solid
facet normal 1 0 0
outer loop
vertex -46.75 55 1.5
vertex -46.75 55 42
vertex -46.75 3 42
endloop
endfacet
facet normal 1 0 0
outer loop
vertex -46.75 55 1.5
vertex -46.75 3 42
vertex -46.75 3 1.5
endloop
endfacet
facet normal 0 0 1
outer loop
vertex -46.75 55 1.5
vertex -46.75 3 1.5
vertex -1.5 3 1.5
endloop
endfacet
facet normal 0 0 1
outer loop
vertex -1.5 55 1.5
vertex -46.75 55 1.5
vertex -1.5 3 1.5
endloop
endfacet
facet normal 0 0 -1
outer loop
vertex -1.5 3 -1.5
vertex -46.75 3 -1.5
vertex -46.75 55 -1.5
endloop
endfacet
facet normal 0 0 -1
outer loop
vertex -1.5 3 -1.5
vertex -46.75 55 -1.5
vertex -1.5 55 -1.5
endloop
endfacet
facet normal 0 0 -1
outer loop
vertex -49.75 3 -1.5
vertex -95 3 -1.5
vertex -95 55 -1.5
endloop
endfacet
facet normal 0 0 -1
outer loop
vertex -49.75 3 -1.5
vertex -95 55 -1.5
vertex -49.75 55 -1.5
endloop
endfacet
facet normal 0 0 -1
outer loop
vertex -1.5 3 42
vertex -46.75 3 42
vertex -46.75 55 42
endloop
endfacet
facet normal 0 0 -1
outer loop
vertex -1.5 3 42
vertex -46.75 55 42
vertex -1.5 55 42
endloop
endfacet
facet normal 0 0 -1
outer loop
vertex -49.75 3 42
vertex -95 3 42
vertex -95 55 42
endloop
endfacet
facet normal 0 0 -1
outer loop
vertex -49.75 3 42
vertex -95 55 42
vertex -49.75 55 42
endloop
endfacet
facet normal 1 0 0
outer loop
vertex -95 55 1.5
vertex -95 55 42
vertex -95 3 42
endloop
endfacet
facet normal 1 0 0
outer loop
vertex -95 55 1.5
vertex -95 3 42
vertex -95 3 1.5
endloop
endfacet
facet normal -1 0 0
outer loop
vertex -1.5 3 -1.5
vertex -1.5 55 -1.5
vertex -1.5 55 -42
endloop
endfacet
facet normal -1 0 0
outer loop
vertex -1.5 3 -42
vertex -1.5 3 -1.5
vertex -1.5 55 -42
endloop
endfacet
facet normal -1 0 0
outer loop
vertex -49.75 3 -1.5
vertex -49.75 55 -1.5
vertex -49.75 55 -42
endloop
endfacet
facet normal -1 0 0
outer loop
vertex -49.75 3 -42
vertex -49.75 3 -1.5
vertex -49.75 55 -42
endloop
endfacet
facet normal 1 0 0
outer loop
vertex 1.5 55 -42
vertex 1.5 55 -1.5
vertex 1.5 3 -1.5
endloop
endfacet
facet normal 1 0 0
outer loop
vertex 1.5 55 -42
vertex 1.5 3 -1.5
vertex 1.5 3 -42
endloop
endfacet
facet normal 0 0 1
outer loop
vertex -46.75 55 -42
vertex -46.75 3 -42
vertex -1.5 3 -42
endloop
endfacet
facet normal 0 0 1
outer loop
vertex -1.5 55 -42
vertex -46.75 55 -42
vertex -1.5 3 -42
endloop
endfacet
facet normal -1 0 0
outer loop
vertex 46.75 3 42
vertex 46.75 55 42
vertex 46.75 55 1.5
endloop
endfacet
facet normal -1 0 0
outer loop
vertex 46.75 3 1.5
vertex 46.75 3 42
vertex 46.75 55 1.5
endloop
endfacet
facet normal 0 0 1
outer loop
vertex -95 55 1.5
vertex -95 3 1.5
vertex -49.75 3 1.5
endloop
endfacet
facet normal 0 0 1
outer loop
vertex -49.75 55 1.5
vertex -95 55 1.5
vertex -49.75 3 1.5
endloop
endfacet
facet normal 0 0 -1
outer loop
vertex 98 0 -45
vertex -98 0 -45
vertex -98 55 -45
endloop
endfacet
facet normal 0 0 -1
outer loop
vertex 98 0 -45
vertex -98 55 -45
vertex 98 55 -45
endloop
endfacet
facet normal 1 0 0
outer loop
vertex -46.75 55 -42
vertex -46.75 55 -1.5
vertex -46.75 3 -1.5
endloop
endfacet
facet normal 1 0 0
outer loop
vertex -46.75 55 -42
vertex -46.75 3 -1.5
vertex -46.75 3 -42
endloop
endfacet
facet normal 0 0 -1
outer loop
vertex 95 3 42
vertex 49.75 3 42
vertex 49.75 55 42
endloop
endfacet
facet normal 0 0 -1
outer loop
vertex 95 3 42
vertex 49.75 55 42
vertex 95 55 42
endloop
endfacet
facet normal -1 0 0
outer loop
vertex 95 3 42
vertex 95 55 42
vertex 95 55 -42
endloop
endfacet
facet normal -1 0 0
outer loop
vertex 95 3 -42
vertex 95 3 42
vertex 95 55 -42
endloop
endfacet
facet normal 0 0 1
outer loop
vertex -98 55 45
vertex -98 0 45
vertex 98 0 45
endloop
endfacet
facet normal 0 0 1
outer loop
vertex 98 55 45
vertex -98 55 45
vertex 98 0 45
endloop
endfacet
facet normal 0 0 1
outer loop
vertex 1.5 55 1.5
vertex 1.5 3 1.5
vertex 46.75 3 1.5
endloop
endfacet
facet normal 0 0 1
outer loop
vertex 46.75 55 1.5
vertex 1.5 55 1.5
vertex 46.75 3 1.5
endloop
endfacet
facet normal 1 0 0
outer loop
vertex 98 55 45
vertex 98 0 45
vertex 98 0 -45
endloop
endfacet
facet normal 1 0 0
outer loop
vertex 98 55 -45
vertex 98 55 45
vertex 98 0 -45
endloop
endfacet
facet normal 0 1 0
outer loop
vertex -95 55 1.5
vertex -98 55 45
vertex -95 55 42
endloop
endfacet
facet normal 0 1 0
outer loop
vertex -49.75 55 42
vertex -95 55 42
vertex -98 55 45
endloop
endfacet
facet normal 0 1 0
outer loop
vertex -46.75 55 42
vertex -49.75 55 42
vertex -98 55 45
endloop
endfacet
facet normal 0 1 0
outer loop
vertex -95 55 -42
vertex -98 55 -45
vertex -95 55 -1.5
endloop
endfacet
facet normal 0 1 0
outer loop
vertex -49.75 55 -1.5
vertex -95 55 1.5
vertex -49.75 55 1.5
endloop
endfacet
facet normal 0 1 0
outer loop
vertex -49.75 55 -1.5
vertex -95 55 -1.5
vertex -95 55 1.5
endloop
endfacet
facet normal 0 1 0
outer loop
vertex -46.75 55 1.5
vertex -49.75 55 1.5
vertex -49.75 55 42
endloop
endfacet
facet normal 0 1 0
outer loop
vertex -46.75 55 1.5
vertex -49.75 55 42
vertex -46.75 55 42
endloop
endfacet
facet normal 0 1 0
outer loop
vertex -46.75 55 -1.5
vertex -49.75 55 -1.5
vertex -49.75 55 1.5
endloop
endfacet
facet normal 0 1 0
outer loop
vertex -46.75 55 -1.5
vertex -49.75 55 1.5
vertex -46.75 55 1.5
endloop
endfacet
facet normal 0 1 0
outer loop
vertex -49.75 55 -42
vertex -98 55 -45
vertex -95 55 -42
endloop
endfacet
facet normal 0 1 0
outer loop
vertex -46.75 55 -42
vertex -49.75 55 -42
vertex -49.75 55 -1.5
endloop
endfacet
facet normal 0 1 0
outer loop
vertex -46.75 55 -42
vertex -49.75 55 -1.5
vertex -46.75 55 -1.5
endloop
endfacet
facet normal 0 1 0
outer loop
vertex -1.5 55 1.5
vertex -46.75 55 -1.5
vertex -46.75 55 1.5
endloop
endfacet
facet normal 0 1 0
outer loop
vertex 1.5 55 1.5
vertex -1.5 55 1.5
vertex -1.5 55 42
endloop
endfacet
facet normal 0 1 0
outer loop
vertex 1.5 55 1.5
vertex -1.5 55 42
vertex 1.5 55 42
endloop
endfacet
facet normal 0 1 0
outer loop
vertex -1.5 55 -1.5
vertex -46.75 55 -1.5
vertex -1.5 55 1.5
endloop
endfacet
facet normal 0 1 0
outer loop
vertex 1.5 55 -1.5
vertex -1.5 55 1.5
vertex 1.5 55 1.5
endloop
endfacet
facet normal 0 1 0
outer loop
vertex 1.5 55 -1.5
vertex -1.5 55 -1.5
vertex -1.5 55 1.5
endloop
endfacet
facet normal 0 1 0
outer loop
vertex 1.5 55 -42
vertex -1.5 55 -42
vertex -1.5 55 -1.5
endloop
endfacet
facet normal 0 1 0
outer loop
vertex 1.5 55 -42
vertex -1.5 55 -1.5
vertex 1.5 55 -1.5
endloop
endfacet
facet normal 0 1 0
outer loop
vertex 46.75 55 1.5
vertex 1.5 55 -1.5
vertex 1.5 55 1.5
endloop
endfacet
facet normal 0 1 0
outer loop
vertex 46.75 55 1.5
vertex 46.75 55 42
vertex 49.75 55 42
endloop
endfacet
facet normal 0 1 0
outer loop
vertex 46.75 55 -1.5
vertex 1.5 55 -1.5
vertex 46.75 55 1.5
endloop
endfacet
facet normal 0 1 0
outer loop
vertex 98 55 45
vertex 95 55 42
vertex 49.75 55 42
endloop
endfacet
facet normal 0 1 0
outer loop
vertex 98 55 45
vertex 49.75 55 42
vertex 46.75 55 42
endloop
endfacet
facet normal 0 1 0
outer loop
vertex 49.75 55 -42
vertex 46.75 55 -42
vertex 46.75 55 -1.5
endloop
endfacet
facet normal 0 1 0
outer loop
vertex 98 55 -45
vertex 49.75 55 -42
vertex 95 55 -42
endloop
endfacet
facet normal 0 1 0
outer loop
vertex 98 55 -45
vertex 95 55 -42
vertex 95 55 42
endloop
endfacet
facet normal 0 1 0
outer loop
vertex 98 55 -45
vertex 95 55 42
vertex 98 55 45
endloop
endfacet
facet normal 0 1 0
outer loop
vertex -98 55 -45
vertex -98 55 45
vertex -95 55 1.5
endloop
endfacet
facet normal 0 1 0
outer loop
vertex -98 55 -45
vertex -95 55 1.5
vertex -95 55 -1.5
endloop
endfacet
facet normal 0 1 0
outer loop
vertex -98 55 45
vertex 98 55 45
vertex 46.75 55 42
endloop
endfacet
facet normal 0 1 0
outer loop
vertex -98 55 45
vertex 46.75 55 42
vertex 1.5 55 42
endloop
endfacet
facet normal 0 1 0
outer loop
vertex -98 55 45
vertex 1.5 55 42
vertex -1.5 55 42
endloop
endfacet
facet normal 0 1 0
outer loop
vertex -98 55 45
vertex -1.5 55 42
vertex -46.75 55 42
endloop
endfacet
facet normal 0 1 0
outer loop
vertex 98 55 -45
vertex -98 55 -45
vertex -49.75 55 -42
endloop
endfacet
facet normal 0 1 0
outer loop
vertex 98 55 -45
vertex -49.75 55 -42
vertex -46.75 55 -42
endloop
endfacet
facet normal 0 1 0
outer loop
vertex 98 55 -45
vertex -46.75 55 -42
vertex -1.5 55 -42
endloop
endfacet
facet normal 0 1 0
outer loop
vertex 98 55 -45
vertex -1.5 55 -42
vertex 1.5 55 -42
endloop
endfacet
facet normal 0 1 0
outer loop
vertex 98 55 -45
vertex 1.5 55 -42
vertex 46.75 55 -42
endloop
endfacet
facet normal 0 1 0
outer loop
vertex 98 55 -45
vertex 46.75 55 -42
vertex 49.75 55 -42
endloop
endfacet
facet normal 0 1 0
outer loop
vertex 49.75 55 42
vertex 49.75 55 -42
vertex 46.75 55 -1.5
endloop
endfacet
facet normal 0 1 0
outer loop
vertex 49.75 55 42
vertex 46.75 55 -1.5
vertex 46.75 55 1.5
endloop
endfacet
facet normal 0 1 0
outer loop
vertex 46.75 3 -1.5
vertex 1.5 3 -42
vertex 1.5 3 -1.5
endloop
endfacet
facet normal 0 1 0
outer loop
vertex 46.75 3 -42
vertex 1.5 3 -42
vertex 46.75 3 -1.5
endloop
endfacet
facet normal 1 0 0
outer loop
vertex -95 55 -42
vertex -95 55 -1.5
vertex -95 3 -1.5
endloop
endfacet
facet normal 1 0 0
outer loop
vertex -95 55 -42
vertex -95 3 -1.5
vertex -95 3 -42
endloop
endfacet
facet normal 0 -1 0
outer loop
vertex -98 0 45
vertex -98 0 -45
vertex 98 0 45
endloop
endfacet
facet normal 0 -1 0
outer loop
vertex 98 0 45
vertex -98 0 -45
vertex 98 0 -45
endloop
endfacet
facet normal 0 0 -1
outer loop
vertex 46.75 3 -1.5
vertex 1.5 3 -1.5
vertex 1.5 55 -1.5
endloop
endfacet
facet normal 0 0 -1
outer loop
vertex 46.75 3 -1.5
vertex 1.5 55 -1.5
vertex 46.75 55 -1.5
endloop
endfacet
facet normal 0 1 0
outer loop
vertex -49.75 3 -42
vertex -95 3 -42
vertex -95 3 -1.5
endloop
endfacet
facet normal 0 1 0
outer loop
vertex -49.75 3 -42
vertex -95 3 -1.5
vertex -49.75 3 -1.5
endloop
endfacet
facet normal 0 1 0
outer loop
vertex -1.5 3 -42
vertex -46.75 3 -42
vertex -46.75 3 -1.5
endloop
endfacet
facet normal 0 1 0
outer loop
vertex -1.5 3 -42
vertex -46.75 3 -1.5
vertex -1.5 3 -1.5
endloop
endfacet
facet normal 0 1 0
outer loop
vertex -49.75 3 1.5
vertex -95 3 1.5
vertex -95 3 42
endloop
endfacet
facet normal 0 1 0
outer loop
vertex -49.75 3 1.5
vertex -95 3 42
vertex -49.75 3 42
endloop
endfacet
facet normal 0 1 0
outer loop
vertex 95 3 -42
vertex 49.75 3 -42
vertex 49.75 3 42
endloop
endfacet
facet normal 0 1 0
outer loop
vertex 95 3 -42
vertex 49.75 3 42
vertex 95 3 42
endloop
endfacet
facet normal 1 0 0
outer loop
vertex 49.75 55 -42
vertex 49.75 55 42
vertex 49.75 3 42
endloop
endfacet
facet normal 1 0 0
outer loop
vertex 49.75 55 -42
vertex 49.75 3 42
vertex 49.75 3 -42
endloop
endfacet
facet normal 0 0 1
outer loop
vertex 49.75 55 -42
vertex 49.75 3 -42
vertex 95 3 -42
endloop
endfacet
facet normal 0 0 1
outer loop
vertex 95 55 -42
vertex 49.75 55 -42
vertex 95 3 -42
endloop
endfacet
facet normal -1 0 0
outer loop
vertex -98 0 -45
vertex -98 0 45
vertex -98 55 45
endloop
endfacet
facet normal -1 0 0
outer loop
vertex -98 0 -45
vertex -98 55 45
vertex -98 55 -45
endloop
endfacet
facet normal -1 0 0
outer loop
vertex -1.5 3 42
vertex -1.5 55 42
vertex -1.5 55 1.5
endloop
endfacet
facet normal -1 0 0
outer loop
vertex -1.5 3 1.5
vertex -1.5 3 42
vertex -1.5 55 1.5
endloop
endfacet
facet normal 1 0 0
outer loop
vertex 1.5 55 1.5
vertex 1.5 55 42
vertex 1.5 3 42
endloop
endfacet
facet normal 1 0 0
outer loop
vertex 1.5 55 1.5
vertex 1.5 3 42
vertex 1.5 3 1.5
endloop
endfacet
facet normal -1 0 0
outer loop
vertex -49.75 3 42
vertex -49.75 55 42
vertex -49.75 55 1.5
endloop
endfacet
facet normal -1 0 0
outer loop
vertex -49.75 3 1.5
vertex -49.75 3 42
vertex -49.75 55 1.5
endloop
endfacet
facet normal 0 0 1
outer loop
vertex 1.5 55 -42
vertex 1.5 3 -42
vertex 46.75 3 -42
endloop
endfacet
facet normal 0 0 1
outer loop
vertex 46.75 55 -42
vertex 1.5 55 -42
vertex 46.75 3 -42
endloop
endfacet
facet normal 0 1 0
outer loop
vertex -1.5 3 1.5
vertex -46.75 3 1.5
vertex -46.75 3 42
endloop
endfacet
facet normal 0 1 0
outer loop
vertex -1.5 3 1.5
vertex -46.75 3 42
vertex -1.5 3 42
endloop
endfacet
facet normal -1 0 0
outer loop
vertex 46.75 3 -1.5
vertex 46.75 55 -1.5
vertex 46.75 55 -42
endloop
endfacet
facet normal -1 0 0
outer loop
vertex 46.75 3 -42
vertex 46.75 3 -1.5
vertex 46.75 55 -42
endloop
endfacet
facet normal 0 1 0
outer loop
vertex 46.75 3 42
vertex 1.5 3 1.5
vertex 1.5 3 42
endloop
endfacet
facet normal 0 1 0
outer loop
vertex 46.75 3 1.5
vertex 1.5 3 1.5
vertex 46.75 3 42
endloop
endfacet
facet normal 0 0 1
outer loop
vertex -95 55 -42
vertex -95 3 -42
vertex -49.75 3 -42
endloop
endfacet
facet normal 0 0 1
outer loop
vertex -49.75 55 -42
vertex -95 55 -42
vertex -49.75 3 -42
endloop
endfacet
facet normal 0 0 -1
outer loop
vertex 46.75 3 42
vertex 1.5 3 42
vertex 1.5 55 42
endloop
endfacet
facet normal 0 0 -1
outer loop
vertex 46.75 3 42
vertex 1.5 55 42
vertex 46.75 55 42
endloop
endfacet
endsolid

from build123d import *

# Parameters (mm, degrees)
SKETCH1_W           = 196
SKETCH1_H           = 90
BOSS_EXTRUDE1_DEPTH = 55
SKETCH2_W           = 45.25
SKETCH2_H           = 40.5
SKETCH2_H_2         = 84
CUT_EXTRUDE1_DEPTH  = 52


with BuildPart() as part:
    # Sketch1 → Boss-Extrude1 (new body)
    with BuildSketch(Plane(origin=(0, 0, 0), x_dir=(1, 0, 0), z_dir=(0, 1, 0))):
        Rectangle(SKETCH1_W, SKETCH1_H)
    extrude(amount=BOSS_EXTRUDE1_DEPTH)

    # Sketch2 → Cut-Extrude1 (cut)
    with BuildSketch(Plane(origin=(0, 55, 0), x_dir=(1, 0, 0), z_dir=(0, 1, 0))):
        with Locations((-72.375, 21.75)):
            Rectangle(SKETCH2_W, SKETCH2_H)
        with Locations((-72.375, -21.75)):
            Rectangle(SKETCH2_W, SKETCH2_H)
        with Locations((-24.125, 21.75)):
            Rectangle(SKETCH2_W, SKETCH2_H)
        with Locations((-24.125, -21.75)):
            Rectangle(SKETCH2_W, SKETCH2_H)
        with Locations((24.125, 21.75)):
            Rectangle(SKETCH2_W, SKETCH2_H)
        with Locations((24.125, -21.75)):
            Rectangle(SKETCH2_W, SKETCH2_H)
        with Locations((72.375, 0)):
            Rectangle(SKETCH2_W, SKETCH2_H_2)
    extrude(amount=-CUT_EXTRUDE1_DEPTH, mode=Mode.SUBTRACT)


solid = part.part
